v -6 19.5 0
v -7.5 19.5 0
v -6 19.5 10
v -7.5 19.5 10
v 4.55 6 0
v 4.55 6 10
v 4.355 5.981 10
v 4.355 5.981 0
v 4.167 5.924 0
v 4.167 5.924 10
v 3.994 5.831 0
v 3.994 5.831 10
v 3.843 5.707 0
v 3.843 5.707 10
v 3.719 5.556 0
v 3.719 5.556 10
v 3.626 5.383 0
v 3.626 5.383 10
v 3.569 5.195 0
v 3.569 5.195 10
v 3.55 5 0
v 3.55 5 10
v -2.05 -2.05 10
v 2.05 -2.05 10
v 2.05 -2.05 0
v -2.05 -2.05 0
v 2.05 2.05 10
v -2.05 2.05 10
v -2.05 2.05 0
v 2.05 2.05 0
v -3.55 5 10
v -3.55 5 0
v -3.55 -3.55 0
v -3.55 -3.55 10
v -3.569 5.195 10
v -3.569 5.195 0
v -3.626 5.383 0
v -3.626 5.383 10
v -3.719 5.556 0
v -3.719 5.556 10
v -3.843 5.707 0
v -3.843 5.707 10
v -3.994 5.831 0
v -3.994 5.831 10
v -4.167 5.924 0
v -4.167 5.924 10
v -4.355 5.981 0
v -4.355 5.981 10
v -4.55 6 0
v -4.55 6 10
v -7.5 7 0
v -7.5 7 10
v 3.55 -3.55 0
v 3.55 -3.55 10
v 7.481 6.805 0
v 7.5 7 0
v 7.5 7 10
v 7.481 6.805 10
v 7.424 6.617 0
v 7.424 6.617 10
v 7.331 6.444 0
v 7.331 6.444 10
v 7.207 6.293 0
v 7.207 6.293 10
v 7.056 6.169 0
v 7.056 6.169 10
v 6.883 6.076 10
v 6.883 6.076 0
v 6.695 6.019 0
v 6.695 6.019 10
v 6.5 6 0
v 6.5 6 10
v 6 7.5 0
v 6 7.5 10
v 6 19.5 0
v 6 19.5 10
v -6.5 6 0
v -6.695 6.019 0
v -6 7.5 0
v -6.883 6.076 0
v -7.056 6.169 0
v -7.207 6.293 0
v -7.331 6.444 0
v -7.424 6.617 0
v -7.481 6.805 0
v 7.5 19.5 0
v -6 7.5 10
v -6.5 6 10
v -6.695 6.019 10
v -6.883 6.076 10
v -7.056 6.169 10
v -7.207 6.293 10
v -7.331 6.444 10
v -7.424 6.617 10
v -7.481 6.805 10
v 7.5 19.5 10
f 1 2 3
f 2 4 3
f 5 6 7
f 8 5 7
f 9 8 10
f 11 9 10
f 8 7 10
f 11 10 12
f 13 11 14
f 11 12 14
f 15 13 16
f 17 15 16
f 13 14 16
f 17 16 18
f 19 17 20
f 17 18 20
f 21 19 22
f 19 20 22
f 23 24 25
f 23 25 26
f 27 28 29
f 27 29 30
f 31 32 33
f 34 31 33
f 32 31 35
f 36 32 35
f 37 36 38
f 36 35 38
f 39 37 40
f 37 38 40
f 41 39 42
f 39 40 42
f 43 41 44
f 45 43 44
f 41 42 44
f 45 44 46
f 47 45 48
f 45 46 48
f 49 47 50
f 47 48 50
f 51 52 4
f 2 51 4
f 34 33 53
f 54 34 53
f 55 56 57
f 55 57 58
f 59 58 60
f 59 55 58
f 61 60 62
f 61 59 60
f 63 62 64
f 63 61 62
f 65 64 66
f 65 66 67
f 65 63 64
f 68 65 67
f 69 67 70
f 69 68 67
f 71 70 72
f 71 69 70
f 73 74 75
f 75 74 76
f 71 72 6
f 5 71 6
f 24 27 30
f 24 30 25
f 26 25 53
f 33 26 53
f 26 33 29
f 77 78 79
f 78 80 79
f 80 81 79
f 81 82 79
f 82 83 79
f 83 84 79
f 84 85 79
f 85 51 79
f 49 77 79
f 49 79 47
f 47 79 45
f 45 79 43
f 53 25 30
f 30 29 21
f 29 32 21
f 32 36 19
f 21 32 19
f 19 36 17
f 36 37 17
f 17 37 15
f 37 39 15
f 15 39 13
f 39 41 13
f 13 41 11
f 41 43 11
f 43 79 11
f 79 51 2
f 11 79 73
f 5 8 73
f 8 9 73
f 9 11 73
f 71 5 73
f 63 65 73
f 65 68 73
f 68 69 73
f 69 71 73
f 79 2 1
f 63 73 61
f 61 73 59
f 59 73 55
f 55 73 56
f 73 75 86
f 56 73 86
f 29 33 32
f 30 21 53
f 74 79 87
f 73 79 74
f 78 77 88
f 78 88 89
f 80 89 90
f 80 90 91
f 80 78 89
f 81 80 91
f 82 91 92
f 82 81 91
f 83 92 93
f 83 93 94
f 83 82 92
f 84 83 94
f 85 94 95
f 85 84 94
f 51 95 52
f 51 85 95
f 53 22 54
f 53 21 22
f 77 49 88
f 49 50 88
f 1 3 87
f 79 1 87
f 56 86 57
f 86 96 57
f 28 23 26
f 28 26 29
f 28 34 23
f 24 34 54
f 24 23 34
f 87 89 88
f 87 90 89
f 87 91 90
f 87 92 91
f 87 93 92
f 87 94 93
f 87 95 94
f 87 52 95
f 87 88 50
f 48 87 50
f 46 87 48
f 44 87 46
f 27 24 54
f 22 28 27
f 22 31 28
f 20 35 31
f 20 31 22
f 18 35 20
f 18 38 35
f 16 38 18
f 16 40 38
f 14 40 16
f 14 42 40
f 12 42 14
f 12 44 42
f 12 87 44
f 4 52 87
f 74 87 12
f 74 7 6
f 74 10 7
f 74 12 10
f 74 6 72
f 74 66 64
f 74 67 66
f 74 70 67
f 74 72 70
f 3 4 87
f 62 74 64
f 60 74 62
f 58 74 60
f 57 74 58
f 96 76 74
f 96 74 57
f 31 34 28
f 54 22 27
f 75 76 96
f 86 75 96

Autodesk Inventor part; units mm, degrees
ref_plane "YZ Plane" through (0, 0, 0) normal (1, 0, 0) x (0, 1, 0)
ref_plane "XZ Plane" through (0, 0, 0) normal (0, 1, 0) x (-1, 0, 0)
ref_plane "XY Plane" through (0, 0, 0) normal (0, 0, 1) x (1, 0, 0)
sketch "Sketch1" plane through (0, 0, 0) normal (0, 0, 1) x (1, 0, 0)
  line L0 (-2.05, 2.05) -> (2.05, 2.05)
  line L1 (2.05, 2.05) -> (2.05, -2.05)
  line L2 (2.05, -2.05) -> (-2.05, -2.05)
  line L3 (-2.05, -2.05) -> (-2.05, 2.05)
  line L4 (0, 2.05) -> (0, -2.05) construction
  line L5 (0, 7.5) -> (-15.55, 7.5)
  line L6 (-15.55, 7.5) -> (-15.55, 6)
  line L7 (-15.55, 6) -> (-3.55, 6)
  line L8 (-3.55, 6) -> (-3.55, -6)
  line L9 (-3.55, -6) -> (-15.55, -6)
  line L10 (-15.55, -6) -> (-15.55, -7.5)
  line L11 (-15.55, -7.5) -> (-0.55, -7.5)
  line L12 (-2.05, 0) -> (2.05, 0) construction
  line L13 (0, 7.5) -> (15.55, 7.5)
  line L14 (15.55, 7.5) -> (15.55, 6)
  line L15 (15.55, 6) -> (3.55, 6)
  line L16 (3.55, 6) -> (3.55, -6)
  line L17 (3.55, -6) -> (15.55, -6)
  line L18 (15.55, -6) -> (15.55, -7.5)
  line L19 (15.55, -7.5) -> (-0.55, -7.5)
  line L20 (-2.05, 2.05) -> (2.05, -2.05) construction
  line L21 (2.05, 2.05) -> (-2.05, -2.05) construction
  line L22 (0, 7.5) -> (0, 2.05) construction
  line L23 (-3.55, 6) -> (-3.55, 7.5)
  line L24 (-3.55, -6) -> (-3.55, -7.5)
  line L25 (3.55, 6) -> (3.55, 7.5)
  line L26 (3.55, -6) -> (3.55, -7.5)
  point P0 (0, 0)
  point P1 (0, 0)
  point P2 (0, 0)
  dimension "d3" = 4.1
  dimension "d4" = 4.1
  dimension "d5" = 12
  dimension "d6" = 1.5
  dimension "d7" = 1.5
  dimension "d8" = 5.45
  dimension "d9" = 5.45
  dimension "d10" = 1.5
  dimension "d11" = 12
  dimension "d37" = 15
extrude "Extrusion1" add sketch "Sketch1" along normal blind 10 contours L13 L25 L16 L26 L19 L11 L24 L8 L23 L5
sketch "Sketch5" plane through (0, 0, 10) normal (0, 0, 1) x (1, 0, 0)
  line L0 (6, 19.5) -> (7.5, 19.5)
  line L1 (7.5, 19.5) -> (7.5, 7.5)
  line L2 (7.5, 7.5) -> (6, 7.5)
  line L3 (6, 7.5) -> (6, 19.5)
  line L4 (3.55, 7.5) -> (-3.55, 7.5) projected
  line L5 (3.55, -7.5) -> (3.55, 7.5) projected
  line L6 (0, 0) -> (0, 23.4065) construction
  point P0 (15.55, 7.5)
  point P1 (-15.55, 7.5)
  point P2 (3.55, -6)
  point P3 (3.55, 6)
  dimension "d41" = 1.5
  dimension "d42" = 12
  dimension "d47" = 6
extrude "Extrusion5" add sketch "Sketch5" against normal up to surface (10 mm away)
mirror "Mirror1" about plane through (0, 0, 0) normal (1, 0, 0) of "Extrusion5"
sketch "Sketch7" plane through (0, 0, 10) normal (0, 0, 1) x (1, 0, 0)
  line L0 (-7.5, 19.5) -> (-7.5, 7.5) projected
  line L1 (-7.5, 7.5) -> (7.5, 7.5)
  line L2 (7.5, 7.5) -> (7.5, 6)
  line L3 (7.5, 6) -> (-7.5, 6)
  line L4 (-7.5, 6) -> (-7.5, 7.5)
  line L5 (7.5, 7.5) -> (7.5, 19.5) projected
  point P0 (0, 0)
  dimension "d53" = 1.5
extrude "Extrusion7" add sketch "Sketch7" against normal up to surface (10 mm away)
fillet "Fillet3" radius 1 4 edges at (-3.55, 6, 5) (3.55, 6, 5) (7.5, 6, 5) (-7.5, 6, 5)
sketch "Sketch8" plane through (0, 0, 10) normal (0, 0, 1) x (1, 0, 0)
  line L0 (-3.55, -3.55) -> (3.55, -3.55)
  line L1 (3.55, -3.55) -> (3.55, -7.5)
  line L2 (3.55, -7.5) -> (-3.55, -7.5)
  line L3 (-3.55, -7.5) -> (-3.55, -3.55)
  line L4 (2.05, -2.05) -> (-2.05, -2.05) projected
  line L5 (3.55, -7.5) -> (3.55, 5) projected
  line L6 (-3.55, 5) -> (-3.55, -7.5) projected
  line L7 (-3.55, -7.5) -> (3.55, -7.5) projected
  point P0 (0, 0)
  dimension "d57" = 1.5
extrude "Extrusion8" cut sketch "Sketch8" against normal blind 10
equation "\"d7\" = d6"
equation "\"d8\" = d9"
properties part number "Rudder_interface" material "ABS Plastic"
